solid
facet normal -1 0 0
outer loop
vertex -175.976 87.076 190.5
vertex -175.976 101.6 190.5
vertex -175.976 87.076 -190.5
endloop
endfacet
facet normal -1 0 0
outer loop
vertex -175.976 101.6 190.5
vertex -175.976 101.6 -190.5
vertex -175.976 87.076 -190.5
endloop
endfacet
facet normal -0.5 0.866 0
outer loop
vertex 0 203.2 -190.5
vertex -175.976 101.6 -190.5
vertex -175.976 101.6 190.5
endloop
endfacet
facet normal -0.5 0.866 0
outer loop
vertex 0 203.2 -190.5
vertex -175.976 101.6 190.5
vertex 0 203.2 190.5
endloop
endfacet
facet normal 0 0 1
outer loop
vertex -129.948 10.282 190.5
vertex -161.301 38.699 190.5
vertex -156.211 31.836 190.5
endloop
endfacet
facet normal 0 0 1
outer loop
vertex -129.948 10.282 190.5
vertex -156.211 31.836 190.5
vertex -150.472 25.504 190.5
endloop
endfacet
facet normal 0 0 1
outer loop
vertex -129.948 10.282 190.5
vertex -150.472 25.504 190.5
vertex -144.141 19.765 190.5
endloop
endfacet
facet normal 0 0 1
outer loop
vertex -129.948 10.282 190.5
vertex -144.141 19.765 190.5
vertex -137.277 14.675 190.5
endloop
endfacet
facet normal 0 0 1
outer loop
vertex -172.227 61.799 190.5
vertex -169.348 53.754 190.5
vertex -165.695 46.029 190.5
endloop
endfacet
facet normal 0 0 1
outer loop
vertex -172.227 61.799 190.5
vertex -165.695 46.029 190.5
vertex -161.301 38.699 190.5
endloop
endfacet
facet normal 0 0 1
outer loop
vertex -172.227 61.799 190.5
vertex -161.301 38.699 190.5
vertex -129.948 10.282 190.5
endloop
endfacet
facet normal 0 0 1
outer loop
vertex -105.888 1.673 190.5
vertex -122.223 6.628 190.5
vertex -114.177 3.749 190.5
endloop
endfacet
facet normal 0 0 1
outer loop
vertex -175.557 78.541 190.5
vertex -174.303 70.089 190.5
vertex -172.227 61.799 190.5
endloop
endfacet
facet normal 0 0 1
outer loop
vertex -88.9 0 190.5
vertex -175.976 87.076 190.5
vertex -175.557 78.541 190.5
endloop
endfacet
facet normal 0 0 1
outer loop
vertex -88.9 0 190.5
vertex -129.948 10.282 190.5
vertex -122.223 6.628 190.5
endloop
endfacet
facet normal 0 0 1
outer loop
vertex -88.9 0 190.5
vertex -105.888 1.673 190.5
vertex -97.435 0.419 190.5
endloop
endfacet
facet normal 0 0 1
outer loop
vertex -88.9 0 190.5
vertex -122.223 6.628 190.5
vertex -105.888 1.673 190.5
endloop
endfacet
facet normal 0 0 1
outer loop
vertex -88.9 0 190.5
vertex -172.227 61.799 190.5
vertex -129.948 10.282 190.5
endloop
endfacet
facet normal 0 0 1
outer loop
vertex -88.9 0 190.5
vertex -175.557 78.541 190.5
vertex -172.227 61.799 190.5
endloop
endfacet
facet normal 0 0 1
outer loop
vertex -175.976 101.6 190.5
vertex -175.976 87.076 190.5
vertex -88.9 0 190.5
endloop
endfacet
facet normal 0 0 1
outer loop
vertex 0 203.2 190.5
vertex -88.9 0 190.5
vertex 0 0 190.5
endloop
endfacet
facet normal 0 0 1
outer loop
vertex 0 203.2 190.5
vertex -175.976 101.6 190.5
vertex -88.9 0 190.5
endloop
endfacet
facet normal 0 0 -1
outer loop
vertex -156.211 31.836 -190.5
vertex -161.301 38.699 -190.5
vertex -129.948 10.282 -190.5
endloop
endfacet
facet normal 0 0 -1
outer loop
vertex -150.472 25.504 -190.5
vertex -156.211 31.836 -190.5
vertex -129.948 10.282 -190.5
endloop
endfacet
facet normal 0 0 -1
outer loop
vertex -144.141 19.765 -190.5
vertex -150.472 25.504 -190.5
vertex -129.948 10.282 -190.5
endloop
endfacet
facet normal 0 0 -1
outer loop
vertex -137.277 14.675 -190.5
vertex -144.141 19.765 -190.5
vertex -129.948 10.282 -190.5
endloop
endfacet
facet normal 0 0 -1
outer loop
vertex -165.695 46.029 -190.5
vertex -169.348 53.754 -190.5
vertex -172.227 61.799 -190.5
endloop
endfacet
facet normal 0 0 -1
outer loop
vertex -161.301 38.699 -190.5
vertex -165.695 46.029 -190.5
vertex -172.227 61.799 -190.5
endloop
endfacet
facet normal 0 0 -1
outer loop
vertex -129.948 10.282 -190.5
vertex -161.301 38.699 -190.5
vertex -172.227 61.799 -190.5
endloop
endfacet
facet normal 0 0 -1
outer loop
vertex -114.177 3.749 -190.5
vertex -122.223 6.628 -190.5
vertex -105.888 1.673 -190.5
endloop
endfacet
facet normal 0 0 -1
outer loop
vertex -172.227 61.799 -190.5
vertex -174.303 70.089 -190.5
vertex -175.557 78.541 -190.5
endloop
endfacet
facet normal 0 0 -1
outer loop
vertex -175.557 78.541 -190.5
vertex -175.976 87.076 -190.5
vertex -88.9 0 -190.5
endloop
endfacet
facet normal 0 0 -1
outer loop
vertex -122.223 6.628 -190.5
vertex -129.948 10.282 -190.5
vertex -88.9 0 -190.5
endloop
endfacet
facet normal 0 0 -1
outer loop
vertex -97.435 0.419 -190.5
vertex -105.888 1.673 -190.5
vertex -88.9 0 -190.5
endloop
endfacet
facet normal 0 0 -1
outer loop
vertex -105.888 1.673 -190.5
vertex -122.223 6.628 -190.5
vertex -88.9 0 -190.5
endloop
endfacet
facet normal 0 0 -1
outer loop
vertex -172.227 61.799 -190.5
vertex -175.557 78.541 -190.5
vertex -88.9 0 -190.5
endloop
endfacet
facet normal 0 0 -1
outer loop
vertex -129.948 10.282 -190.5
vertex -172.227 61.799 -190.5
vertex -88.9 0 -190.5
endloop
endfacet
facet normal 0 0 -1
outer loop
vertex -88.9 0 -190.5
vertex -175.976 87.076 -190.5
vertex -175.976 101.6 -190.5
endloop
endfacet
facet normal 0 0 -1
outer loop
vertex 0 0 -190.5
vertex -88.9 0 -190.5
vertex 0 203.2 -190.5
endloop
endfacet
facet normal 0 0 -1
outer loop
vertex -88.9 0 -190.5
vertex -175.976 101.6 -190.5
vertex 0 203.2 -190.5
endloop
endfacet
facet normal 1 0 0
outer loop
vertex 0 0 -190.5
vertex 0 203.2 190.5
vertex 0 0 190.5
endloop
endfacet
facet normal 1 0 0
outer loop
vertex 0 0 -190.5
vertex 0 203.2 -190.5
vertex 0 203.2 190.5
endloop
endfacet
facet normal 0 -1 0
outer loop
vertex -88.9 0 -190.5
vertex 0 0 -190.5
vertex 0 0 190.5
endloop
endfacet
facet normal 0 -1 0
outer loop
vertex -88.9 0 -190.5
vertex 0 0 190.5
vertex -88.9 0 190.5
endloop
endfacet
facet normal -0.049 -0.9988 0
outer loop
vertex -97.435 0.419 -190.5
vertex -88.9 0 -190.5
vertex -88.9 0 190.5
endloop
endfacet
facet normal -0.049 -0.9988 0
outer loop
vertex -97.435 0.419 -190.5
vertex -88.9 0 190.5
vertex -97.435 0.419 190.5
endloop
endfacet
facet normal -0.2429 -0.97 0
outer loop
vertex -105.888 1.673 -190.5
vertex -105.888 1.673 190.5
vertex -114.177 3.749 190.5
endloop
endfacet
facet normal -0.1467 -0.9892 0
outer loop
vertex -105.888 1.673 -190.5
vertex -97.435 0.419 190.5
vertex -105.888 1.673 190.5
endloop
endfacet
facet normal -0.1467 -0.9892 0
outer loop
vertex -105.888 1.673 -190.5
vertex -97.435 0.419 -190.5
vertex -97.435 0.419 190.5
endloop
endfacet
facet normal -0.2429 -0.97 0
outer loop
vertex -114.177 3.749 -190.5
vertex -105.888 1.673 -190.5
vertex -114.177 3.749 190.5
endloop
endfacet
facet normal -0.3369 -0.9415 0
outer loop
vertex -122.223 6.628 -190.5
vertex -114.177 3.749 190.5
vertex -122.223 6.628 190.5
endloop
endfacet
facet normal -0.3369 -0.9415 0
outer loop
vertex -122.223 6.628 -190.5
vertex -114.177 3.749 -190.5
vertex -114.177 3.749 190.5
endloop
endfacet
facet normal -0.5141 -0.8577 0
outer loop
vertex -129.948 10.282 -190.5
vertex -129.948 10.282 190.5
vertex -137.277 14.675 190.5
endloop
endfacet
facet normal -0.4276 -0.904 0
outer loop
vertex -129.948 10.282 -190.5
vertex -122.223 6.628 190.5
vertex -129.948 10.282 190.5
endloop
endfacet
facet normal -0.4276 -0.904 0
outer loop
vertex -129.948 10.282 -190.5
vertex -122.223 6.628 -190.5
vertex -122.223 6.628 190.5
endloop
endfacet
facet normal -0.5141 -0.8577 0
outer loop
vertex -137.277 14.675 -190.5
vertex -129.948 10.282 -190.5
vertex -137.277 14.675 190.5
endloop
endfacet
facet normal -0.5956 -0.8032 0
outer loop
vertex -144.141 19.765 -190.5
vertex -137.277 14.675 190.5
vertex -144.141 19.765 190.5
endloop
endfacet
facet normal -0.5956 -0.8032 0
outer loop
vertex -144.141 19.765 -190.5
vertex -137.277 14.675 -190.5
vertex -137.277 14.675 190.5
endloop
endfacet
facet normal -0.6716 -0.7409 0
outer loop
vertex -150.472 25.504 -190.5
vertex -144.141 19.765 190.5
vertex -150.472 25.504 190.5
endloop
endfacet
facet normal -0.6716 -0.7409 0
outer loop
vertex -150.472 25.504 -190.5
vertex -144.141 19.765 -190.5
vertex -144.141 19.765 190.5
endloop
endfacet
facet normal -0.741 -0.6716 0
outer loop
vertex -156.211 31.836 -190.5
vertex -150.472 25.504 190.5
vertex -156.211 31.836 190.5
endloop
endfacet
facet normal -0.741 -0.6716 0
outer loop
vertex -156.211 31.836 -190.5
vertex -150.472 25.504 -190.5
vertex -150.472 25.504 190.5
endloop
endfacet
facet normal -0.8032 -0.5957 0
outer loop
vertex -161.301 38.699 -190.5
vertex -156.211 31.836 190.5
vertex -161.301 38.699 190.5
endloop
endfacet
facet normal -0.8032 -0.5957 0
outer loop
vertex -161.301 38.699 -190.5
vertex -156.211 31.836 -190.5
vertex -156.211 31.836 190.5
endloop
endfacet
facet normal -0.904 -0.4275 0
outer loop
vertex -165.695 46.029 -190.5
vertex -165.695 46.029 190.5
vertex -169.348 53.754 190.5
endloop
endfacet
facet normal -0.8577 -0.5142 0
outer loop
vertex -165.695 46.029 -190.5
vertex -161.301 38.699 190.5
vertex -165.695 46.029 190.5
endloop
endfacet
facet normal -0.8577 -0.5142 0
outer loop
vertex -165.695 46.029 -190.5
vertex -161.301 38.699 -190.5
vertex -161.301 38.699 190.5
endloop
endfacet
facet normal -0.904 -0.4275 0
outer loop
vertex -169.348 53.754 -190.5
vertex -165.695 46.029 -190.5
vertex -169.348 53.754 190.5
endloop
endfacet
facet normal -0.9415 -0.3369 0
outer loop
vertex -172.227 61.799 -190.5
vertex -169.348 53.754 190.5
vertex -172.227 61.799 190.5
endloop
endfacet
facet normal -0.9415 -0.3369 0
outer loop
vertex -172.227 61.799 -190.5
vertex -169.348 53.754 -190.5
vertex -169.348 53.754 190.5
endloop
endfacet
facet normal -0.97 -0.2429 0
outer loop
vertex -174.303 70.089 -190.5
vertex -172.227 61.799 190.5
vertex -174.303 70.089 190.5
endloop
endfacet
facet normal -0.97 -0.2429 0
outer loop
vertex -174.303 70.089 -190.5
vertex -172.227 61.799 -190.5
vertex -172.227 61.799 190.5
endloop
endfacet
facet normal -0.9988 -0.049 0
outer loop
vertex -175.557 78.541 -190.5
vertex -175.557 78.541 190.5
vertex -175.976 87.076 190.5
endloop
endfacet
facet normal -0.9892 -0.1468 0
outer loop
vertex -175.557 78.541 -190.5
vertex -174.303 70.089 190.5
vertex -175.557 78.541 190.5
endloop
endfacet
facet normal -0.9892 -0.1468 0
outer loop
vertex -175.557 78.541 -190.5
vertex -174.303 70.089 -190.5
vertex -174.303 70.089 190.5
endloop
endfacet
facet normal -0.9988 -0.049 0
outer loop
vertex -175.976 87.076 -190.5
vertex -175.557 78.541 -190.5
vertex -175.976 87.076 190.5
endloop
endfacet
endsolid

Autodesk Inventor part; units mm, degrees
ref_plane "YZ Plane" through (0, 0, 0) normal (1, 0, 0) x (0, 1, 0)
ref_plane "XZ Plane" through (0, 0, 0) normal (0, 1, 0) x (-1, 0, 0)
ref_plane "XY Plane" through (0, 0, 0) normal (0, 0, 1) x (1, 0, 0)
sketch "Sketch1" plane through (0, 0, 0) normal (0, 0, 1) x (1, 0, 0)
  line L0 (0, 203.2) -> (0, 0)
  line L1 (0, 0) -> (-88.9, 0)
  line L2 (-175.9764, 101.6) -> (-175.9764, 87.0764)
  arc A0 (-175.9764, 87.0764) -> (-88.9, 0) centre (-88.9, 87.0764) ccw
  line L3 (-175.9764, 101.6) -> (0, 203.2)
  line L4 (0, -62.2809) -> (0, 247.4468) projected
  dimension "d1" = 203.2
  dimension "d2" = 60
  dimension "d3" = 203.2
  dimension "d4" = 88.9
extrude "Extrusion1" add sketch "Sketch1" along normal mid plane 381
properties part number "DMJ_Waist"
